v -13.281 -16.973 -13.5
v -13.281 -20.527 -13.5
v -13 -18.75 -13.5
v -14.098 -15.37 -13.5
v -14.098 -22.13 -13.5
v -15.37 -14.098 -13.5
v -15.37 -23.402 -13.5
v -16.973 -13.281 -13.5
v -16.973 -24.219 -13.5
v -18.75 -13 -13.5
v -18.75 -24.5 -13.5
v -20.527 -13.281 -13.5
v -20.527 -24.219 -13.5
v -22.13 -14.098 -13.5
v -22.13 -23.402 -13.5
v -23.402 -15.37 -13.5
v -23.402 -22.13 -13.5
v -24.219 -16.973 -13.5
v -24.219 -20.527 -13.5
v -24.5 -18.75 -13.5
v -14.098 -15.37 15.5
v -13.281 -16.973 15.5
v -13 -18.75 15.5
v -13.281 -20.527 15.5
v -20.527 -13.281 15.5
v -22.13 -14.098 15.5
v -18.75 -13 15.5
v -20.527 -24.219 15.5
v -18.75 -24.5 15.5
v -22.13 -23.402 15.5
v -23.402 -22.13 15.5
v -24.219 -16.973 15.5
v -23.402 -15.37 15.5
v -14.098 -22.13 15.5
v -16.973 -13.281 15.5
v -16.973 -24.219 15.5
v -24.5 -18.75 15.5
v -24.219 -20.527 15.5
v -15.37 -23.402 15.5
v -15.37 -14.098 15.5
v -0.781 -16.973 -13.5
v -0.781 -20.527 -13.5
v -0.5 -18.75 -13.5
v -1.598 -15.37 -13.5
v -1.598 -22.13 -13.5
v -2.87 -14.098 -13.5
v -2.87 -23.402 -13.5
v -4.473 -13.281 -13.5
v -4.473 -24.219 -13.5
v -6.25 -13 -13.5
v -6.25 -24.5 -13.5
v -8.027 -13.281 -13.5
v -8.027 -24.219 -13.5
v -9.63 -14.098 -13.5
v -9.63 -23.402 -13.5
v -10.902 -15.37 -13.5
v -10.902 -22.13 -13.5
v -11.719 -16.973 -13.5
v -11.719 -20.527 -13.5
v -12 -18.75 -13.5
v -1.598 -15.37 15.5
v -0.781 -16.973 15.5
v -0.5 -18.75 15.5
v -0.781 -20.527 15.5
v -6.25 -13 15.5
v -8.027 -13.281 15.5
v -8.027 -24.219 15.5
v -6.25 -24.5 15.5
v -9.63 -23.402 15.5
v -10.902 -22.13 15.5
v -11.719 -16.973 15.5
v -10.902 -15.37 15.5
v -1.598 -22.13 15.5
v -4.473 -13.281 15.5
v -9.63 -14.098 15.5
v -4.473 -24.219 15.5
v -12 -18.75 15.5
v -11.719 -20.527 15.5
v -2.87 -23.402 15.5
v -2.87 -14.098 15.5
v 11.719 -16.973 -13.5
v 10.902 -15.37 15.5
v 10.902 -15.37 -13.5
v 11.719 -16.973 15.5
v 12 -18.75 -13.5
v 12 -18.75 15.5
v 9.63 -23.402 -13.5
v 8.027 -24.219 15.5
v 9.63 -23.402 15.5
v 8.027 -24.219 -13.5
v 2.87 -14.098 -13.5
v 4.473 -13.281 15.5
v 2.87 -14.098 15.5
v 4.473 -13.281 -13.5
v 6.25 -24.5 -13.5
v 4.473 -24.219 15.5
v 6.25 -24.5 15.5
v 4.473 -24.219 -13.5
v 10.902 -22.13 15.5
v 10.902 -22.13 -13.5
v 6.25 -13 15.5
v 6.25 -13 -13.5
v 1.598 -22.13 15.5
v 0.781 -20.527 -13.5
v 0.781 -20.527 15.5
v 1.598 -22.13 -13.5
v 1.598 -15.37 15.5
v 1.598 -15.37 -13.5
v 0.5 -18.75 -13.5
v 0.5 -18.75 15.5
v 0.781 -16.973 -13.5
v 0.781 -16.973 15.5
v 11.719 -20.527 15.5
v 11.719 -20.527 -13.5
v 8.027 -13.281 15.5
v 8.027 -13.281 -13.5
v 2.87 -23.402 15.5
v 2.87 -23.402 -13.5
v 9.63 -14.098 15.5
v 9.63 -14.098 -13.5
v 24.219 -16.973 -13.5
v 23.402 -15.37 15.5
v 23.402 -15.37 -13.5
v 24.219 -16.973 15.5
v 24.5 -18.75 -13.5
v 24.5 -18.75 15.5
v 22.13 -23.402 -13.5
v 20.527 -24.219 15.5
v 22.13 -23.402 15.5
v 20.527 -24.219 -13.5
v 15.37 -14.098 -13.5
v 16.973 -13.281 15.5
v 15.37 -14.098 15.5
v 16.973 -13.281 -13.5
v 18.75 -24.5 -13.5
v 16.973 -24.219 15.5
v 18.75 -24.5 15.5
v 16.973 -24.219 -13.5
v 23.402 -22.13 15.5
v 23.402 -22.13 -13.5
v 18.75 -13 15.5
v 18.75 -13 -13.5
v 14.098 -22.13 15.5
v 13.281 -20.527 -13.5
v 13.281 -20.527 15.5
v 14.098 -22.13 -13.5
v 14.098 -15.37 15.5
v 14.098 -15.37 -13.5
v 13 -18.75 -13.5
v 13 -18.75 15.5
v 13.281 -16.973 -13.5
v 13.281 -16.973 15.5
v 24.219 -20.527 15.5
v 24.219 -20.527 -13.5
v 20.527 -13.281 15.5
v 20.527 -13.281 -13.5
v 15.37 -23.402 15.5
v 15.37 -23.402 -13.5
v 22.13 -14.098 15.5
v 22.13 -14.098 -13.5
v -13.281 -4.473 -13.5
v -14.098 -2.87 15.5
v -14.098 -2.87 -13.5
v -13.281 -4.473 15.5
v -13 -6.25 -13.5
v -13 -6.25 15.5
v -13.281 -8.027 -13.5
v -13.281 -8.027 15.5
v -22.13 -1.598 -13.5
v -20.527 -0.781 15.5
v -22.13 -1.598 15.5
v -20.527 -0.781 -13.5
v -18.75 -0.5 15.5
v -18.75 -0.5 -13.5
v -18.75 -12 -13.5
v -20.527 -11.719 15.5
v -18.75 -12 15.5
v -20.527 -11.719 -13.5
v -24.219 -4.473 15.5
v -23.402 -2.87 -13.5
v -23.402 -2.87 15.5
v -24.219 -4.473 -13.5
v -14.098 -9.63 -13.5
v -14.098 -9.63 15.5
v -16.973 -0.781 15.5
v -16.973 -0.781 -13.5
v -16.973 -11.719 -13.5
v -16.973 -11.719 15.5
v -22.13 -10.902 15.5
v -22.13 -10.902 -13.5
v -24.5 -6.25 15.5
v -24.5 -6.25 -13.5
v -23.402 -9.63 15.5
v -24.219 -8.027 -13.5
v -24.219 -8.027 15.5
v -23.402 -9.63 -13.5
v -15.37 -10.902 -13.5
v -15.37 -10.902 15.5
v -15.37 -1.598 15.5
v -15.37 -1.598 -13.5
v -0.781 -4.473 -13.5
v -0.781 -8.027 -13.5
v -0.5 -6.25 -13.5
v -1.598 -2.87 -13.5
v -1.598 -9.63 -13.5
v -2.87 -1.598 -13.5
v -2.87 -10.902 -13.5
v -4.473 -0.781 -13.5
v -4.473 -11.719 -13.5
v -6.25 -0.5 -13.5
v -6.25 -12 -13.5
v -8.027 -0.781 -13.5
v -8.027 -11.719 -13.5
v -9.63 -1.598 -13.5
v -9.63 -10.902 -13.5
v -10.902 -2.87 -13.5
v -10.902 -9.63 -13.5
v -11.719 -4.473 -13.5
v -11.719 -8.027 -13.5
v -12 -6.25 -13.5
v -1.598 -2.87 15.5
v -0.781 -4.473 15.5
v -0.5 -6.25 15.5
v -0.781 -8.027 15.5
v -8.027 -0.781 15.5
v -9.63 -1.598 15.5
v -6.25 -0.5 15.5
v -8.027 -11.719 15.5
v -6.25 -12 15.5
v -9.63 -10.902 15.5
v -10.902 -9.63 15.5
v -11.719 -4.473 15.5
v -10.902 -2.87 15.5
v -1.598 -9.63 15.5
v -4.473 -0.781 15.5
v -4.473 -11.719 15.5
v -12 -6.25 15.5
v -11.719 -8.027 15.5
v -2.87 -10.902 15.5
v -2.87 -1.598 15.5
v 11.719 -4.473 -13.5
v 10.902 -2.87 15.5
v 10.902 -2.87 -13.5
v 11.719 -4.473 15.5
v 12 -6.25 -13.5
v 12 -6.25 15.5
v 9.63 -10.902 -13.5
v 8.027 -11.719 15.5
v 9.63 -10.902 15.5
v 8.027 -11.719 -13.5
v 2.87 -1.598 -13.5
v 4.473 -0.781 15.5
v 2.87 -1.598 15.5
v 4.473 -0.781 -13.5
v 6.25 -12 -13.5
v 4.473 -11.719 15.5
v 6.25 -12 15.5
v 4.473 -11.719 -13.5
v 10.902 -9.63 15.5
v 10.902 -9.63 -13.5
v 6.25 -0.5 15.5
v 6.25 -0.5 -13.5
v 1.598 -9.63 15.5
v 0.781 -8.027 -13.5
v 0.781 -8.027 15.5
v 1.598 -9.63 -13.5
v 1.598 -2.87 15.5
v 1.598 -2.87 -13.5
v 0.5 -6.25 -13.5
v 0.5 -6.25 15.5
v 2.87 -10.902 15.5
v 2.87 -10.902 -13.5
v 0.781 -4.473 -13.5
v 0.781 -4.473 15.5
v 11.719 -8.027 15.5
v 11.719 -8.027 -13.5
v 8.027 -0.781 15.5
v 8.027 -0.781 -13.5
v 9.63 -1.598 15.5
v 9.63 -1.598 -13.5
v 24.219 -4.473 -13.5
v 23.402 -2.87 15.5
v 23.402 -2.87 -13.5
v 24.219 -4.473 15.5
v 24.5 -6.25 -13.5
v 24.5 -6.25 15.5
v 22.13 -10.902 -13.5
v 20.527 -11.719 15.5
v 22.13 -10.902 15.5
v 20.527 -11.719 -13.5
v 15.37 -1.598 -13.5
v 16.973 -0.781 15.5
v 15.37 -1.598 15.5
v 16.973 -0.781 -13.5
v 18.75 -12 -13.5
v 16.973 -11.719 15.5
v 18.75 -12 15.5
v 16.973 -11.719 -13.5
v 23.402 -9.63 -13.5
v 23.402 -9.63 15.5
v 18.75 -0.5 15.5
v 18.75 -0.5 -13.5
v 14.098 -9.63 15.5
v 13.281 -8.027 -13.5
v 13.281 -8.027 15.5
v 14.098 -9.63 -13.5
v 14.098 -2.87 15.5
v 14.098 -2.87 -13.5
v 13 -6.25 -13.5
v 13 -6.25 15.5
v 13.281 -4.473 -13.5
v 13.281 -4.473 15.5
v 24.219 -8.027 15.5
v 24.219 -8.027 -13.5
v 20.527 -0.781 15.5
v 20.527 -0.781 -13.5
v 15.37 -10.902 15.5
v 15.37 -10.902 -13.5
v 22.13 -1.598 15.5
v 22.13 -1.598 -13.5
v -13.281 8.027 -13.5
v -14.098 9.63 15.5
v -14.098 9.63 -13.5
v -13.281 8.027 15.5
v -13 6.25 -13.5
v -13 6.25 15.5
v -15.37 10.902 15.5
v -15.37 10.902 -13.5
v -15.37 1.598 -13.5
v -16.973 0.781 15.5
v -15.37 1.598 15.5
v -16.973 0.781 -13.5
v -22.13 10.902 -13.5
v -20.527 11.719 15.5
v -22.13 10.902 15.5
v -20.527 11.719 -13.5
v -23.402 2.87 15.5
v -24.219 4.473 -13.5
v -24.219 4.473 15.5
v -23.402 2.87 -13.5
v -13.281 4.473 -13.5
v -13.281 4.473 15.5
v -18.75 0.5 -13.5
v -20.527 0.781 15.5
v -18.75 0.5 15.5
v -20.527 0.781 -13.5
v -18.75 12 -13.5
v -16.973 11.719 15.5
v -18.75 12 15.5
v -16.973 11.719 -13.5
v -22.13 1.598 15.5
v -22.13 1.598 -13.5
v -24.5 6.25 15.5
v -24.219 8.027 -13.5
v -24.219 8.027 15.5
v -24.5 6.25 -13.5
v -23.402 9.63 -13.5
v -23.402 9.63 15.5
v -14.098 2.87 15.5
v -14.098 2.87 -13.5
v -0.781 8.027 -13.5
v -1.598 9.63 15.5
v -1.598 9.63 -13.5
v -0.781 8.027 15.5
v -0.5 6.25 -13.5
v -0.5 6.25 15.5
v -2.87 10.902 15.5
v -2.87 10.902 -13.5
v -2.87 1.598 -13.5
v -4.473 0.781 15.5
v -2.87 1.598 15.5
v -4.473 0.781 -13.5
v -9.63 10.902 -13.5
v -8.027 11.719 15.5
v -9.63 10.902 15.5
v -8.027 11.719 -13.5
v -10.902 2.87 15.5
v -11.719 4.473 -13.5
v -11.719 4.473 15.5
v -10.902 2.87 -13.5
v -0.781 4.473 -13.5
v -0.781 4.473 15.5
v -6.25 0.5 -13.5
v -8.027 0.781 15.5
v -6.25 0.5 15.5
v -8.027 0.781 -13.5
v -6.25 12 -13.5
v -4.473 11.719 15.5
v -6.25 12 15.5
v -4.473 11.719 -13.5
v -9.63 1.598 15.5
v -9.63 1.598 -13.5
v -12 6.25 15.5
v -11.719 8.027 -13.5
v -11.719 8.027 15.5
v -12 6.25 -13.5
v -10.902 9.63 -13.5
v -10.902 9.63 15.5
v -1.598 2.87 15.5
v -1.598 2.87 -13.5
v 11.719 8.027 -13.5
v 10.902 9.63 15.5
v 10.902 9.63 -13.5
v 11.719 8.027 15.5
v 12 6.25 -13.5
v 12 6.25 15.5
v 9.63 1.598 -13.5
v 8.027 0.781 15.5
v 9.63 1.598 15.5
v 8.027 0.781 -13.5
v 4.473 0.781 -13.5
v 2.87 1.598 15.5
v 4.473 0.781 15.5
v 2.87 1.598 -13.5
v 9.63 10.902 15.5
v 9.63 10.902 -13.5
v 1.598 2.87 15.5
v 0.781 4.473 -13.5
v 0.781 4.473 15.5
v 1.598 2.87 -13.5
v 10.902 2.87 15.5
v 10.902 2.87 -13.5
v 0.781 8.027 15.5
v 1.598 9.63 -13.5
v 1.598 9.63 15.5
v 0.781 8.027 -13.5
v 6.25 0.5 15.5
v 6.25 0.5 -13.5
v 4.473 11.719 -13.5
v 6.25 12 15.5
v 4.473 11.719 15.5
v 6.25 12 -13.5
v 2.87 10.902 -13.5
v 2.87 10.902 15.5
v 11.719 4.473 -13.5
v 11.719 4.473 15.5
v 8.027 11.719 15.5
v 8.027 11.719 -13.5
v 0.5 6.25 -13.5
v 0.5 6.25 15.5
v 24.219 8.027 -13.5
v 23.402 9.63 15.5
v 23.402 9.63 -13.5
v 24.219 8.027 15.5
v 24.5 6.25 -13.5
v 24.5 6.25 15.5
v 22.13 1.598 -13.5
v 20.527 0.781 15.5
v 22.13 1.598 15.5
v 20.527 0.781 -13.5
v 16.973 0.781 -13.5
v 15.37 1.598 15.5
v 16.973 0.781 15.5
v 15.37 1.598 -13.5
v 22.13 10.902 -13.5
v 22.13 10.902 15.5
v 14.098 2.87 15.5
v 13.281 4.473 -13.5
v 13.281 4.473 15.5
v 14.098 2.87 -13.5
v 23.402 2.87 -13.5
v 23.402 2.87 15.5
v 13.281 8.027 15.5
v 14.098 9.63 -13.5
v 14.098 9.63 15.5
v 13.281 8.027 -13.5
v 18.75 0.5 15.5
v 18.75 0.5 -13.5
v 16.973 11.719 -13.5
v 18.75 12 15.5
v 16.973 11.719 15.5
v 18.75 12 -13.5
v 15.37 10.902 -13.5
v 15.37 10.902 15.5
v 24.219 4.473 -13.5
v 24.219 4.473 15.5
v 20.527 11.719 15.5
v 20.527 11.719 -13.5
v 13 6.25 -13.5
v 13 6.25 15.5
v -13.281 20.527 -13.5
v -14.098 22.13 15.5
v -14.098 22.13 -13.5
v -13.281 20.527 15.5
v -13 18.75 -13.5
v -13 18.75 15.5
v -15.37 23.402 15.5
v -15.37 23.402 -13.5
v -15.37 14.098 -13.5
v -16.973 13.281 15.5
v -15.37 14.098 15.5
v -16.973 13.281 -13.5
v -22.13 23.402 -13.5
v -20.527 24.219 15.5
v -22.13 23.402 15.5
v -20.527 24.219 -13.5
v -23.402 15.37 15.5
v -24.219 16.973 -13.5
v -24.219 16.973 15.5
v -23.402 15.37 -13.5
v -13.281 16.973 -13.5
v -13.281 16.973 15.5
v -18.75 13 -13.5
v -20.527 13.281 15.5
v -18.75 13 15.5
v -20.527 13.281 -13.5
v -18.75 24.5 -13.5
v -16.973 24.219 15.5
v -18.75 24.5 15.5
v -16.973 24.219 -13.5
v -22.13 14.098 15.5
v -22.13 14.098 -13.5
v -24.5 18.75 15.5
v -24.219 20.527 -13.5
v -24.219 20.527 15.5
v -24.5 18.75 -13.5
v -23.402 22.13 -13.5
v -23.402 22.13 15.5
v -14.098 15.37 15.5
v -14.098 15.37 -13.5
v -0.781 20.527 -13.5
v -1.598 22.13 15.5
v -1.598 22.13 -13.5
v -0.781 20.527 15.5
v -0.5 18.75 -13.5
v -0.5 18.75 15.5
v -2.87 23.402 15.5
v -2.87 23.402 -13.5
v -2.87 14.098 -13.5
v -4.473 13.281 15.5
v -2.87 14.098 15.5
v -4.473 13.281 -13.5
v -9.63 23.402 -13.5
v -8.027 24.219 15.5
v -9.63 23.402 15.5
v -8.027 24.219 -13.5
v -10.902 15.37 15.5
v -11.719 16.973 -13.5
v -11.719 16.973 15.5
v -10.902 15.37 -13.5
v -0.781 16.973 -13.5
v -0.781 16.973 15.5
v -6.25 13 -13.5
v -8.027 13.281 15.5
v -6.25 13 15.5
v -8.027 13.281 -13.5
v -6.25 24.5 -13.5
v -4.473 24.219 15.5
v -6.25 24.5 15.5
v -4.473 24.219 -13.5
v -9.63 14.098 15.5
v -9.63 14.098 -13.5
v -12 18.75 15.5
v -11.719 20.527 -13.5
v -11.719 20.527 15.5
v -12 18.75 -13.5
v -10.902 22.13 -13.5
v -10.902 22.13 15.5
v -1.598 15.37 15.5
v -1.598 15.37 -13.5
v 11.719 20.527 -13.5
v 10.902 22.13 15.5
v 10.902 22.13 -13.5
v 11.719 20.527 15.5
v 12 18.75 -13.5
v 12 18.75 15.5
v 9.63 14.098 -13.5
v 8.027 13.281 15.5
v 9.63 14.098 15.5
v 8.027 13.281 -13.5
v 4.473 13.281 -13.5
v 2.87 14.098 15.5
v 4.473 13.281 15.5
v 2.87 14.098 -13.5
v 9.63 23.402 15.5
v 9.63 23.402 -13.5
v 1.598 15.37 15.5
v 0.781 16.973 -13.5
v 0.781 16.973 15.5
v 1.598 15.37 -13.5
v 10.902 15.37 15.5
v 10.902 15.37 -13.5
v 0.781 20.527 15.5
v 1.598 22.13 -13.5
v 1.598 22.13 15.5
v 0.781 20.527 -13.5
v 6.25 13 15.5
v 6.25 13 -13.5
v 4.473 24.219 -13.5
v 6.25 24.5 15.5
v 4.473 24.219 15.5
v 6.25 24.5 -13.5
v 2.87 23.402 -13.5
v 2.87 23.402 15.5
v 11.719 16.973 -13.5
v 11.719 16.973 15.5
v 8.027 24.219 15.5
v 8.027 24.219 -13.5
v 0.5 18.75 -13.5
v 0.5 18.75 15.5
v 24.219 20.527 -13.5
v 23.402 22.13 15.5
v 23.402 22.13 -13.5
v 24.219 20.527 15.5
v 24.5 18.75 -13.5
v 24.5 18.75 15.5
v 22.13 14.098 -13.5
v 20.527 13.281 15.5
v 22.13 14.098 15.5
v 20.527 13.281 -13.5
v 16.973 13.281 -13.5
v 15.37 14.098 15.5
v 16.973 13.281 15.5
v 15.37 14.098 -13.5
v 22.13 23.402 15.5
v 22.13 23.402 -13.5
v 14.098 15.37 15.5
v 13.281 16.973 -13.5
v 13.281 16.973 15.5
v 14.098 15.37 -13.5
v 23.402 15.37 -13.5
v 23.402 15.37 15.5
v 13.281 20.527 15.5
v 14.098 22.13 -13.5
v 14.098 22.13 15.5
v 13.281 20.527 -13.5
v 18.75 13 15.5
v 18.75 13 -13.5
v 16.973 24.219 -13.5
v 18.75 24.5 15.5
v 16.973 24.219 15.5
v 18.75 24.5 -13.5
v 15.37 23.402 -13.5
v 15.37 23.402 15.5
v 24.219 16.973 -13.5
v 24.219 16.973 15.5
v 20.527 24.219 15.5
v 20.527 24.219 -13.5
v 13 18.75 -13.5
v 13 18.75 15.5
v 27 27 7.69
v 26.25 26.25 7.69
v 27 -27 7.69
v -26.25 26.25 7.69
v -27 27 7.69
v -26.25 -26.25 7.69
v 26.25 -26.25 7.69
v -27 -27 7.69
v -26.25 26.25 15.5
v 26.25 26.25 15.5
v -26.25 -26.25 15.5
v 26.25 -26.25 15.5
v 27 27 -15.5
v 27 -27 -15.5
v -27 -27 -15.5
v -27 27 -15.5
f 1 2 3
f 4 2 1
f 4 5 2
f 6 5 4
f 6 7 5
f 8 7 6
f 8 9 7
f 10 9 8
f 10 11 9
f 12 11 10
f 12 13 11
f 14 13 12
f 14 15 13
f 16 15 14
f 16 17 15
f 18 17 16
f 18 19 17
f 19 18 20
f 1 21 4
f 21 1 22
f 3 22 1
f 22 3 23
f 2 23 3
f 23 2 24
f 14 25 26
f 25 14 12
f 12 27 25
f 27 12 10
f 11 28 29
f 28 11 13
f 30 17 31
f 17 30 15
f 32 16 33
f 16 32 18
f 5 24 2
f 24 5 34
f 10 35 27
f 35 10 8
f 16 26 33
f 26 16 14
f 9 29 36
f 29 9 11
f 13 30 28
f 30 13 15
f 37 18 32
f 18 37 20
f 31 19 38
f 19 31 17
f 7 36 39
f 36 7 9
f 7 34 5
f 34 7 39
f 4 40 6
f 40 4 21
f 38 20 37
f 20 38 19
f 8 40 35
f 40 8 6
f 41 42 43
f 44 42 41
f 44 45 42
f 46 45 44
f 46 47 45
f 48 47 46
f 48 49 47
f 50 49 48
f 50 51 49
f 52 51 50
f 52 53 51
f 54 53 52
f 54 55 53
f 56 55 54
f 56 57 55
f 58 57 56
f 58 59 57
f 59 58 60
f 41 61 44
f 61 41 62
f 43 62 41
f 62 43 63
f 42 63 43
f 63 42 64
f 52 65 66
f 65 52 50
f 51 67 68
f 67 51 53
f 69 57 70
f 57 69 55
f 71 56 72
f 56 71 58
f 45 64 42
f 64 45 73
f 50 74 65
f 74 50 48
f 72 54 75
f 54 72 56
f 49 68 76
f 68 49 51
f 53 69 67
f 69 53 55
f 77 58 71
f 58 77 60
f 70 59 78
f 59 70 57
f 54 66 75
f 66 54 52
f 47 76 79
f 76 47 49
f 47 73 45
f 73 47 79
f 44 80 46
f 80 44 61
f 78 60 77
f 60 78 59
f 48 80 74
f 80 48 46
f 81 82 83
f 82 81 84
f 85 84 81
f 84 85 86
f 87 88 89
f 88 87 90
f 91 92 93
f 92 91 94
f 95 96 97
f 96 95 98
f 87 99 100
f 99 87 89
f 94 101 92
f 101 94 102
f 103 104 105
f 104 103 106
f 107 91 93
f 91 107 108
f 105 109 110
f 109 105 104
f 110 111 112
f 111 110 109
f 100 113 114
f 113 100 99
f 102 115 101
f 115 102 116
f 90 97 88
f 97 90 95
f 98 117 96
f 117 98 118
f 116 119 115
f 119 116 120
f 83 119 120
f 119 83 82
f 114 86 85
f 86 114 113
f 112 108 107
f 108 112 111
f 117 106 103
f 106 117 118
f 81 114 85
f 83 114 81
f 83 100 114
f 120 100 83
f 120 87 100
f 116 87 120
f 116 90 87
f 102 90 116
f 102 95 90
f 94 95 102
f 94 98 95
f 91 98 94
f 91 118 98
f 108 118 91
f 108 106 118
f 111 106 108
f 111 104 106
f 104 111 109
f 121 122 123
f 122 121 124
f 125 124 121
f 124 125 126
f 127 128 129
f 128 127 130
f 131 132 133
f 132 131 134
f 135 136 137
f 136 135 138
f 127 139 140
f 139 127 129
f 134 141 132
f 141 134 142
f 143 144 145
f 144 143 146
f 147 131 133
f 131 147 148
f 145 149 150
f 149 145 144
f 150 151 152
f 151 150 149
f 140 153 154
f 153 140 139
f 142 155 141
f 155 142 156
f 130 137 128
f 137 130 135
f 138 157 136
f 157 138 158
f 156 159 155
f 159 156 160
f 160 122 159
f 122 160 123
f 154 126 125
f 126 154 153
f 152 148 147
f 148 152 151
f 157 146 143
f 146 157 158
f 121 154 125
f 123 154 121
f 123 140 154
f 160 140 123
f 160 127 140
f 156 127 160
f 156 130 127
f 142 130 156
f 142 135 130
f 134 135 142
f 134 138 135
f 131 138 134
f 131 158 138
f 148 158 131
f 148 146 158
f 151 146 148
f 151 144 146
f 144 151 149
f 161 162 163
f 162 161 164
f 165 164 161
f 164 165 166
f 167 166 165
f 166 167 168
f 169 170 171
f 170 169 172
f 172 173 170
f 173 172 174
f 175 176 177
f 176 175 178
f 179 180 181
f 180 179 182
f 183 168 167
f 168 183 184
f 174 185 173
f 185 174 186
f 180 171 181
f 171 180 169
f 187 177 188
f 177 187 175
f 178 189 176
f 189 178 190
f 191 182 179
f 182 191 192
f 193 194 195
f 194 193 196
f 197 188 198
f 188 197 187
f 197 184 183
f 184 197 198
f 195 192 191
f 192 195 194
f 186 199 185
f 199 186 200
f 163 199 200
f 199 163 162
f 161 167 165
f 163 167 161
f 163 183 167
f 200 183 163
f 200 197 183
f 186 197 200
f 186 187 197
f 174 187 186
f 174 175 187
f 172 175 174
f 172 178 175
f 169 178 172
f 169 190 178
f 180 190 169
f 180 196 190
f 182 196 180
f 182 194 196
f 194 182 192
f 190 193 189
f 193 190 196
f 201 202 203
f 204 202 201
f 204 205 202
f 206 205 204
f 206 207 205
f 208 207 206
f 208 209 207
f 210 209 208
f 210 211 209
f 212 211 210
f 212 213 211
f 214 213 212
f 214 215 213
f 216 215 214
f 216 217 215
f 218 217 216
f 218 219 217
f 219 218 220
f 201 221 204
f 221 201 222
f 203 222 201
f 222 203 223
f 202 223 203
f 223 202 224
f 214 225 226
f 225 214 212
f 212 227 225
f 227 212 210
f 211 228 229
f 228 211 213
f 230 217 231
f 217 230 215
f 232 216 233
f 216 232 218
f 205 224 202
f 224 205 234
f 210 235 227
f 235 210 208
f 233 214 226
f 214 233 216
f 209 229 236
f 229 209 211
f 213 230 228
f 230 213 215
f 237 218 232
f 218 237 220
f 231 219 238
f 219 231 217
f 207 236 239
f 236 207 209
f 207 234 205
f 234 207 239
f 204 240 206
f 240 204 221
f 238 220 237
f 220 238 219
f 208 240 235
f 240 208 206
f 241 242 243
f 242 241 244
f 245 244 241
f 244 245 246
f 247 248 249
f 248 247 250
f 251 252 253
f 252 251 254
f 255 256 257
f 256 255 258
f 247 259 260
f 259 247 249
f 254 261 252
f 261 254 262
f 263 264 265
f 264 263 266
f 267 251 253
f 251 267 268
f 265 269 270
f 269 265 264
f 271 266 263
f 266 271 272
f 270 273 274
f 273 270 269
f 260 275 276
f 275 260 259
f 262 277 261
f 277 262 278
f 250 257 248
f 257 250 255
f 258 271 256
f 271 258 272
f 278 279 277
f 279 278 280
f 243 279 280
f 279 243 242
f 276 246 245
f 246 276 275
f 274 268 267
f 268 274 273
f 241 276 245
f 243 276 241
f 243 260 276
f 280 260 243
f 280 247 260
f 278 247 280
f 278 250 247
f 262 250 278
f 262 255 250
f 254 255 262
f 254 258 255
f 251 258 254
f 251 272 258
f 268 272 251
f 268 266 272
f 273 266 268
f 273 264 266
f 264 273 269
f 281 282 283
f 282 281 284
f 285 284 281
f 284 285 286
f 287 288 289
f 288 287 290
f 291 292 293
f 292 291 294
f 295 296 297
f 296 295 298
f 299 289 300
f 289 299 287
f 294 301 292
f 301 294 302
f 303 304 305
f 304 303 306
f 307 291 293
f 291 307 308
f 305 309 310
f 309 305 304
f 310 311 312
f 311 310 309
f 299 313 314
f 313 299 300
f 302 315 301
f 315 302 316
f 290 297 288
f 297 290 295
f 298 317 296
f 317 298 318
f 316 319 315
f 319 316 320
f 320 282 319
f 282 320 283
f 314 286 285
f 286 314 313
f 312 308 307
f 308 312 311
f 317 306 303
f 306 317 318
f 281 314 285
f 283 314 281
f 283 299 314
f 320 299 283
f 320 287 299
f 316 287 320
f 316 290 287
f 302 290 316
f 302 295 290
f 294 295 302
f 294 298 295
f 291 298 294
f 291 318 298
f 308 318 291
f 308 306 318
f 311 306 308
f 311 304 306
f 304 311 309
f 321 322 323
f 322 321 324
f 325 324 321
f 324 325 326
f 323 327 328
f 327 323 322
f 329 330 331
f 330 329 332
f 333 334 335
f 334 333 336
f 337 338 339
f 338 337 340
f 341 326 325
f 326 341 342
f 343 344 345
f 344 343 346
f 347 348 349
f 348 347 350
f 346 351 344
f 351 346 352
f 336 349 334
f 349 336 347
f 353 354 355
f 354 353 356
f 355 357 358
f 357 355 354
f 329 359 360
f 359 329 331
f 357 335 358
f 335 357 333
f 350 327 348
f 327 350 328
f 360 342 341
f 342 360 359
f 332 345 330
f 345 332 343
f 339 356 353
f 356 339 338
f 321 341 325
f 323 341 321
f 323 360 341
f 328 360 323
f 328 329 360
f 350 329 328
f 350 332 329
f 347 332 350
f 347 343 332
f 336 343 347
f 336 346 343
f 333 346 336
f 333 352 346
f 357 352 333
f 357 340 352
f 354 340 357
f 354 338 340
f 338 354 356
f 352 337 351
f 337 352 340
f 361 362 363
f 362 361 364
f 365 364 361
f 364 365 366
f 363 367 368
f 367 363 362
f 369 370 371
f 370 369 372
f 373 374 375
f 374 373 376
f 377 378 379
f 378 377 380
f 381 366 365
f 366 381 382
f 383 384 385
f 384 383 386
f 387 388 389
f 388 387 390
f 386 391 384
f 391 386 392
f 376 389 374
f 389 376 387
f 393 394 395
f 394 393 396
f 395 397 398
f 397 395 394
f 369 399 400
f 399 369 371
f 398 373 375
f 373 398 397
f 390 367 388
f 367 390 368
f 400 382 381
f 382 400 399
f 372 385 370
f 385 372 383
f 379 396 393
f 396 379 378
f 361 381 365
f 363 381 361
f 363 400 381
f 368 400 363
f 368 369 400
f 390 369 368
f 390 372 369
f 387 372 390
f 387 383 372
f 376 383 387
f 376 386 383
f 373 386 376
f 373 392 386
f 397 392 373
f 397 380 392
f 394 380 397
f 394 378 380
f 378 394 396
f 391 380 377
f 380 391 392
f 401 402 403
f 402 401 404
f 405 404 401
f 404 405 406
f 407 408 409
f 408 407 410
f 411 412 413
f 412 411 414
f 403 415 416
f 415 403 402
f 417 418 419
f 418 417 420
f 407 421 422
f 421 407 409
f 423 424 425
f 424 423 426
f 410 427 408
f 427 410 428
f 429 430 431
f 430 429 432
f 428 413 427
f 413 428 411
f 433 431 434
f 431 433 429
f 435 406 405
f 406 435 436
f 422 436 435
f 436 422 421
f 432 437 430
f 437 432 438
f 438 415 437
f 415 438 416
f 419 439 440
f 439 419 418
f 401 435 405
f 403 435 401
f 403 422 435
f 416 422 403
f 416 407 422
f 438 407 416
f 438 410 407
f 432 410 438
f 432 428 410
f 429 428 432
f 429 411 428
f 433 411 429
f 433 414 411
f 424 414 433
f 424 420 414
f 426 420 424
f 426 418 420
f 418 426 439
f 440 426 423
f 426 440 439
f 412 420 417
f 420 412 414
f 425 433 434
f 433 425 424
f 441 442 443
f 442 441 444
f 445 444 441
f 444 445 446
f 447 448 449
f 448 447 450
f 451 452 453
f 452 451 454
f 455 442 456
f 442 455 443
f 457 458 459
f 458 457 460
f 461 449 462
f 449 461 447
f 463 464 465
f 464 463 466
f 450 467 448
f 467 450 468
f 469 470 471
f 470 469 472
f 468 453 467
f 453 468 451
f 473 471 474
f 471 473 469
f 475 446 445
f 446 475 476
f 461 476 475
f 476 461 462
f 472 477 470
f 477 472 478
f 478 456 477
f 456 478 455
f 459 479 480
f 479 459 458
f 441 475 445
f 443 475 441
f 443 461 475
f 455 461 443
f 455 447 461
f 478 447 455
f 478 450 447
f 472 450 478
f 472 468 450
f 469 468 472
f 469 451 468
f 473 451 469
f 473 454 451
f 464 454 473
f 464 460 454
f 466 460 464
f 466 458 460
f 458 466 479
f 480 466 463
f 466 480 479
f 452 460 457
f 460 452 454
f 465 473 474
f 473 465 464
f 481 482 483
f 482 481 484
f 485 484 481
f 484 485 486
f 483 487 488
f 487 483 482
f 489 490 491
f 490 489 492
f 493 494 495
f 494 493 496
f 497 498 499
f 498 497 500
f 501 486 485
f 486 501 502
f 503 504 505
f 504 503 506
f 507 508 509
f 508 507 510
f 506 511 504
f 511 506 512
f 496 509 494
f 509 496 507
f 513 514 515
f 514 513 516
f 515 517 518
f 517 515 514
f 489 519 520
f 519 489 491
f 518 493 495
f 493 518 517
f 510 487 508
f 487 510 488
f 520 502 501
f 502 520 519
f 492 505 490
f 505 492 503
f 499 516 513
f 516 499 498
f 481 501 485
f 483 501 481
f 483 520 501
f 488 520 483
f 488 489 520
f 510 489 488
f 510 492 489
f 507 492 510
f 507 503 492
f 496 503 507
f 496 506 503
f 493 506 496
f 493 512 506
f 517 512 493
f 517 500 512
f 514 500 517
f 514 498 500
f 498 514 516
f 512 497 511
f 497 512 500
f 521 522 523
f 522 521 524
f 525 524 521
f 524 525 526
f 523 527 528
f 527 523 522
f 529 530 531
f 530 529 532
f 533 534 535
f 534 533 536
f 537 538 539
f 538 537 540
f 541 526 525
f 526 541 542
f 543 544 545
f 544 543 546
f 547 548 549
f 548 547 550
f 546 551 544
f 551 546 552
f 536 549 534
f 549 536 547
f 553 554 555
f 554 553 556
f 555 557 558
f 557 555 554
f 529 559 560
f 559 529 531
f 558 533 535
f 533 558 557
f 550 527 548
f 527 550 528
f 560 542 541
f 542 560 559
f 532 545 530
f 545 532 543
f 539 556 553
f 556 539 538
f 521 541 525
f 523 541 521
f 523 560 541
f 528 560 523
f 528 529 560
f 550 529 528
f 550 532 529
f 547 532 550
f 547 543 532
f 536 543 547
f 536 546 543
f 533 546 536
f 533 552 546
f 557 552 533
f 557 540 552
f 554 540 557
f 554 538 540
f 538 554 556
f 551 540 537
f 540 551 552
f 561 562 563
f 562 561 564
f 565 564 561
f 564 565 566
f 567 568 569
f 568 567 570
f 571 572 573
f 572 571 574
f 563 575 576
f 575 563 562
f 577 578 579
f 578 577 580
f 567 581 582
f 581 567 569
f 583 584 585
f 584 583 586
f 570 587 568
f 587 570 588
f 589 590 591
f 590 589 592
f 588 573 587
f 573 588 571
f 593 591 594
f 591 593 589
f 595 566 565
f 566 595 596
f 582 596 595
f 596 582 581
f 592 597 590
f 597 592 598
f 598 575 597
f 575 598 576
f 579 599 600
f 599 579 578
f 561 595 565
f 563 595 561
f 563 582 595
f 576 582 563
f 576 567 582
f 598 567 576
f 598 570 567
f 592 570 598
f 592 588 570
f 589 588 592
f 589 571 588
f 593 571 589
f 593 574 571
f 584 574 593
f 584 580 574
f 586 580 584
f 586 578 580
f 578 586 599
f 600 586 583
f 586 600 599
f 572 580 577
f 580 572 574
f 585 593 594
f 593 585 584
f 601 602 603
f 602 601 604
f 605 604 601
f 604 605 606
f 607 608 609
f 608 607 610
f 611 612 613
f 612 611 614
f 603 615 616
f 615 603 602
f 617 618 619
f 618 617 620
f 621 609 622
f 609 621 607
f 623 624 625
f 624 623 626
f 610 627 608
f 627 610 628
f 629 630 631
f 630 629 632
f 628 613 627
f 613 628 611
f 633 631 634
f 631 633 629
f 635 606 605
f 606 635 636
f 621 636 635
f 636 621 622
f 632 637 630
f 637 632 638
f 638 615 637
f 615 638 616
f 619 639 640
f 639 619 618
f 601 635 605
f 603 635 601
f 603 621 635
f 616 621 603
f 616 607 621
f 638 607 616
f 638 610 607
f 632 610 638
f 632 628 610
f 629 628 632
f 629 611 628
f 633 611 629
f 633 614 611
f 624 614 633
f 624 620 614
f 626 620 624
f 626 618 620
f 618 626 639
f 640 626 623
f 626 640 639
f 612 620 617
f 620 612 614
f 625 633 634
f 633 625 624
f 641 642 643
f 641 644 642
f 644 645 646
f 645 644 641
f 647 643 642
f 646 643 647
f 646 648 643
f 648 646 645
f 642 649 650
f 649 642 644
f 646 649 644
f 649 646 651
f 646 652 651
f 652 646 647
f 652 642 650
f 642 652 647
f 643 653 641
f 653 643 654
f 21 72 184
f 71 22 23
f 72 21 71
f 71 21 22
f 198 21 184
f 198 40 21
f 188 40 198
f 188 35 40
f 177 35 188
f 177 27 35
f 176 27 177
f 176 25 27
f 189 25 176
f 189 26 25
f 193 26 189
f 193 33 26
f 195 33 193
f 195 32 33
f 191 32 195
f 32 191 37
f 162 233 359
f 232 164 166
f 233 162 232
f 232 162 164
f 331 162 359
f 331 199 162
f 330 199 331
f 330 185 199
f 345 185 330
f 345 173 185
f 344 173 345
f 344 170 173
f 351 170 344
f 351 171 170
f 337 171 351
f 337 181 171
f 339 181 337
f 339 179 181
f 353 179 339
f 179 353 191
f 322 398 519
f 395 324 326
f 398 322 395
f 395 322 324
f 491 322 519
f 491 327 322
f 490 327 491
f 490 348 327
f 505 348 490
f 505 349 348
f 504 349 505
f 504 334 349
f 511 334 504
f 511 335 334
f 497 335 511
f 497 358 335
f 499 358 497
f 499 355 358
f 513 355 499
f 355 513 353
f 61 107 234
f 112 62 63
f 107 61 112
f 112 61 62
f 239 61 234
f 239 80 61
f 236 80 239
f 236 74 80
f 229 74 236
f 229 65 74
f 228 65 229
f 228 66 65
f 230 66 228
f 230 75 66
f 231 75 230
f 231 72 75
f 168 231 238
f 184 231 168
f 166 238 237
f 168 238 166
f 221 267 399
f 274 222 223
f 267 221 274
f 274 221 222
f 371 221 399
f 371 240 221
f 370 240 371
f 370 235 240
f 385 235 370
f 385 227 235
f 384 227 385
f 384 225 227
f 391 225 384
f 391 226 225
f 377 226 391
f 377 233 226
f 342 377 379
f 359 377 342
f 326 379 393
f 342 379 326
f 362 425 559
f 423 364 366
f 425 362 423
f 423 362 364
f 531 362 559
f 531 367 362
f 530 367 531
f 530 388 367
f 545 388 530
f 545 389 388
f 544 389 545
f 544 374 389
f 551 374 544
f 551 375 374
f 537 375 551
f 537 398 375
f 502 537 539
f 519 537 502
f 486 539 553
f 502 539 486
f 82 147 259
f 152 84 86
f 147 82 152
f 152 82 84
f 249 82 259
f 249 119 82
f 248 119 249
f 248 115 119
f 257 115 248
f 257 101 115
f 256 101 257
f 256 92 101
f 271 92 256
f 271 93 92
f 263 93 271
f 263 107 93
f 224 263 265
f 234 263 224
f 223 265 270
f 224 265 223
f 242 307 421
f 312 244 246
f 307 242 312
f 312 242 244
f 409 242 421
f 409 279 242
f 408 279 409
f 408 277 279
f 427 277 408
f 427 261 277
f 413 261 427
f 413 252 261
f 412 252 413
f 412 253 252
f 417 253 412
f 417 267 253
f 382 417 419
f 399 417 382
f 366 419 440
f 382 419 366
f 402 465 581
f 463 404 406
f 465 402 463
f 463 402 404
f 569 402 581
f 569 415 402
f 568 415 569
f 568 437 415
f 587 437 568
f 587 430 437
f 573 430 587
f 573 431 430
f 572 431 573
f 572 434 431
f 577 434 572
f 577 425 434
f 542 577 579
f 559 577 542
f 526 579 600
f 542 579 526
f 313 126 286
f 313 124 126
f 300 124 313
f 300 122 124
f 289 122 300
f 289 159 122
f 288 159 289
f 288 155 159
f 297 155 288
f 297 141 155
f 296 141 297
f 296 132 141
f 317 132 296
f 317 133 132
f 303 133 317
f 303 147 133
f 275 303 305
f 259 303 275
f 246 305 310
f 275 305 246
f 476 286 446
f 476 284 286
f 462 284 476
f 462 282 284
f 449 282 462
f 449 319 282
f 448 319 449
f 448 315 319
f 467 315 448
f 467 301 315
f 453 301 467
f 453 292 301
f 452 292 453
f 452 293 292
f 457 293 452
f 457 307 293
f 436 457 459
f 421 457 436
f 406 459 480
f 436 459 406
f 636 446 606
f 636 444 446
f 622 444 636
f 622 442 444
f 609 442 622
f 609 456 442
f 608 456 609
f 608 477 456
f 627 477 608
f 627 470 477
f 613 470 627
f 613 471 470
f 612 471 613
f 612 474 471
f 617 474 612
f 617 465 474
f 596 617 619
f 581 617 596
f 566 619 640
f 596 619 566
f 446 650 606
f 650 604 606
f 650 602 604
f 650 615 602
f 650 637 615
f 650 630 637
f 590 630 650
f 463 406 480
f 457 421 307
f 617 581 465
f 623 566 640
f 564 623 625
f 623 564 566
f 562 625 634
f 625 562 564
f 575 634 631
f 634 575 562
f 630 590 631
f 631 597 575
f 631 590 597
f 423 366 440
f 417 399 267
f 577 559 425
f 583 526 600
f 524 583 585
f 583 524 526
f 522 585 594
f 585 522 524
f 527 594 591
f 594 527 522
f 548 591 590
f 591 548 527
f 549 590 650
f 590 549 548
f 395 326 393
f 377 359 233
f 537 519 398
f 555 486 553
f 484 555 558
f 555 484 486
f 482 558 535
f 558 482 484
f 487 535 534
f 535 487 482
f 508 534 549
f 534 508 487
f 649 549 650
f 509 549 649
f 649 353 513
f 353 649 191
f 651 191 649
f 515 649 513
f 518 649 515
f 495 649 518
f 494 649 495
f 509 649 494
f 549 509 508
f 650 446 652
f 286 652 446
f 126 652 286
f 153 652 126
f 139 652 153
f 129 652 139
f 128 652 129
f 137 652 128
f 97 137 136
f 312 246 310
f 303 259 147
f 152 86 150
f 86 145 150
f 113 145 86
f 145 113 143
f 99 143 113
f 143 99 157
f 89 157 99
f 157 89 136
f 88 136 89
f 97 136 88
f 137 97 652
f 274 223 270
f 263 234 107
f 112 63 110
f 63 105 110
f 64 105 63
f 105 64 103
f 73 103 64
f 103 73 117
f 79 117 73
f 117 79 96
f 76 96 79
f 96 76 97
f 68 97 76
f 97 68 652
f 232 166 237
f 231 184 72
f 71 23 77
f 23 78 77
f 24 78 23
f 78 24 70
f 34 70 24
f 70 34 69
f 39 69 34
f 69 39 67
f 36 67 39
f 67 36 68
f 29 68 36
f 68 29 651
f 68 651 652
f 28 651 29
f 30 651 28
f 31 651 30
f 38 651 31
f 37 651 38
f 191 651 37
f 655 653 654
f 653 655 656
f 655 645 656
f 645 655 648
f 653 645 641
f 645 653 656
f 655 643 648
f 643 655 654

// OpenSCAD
// [FL_INDEX: keywords="openscad, 3d_parametric, Battery_Box, csg_solid" | COT="Parametric OpenSCAD design from 3DCodeverse"]
// Title: Battery Box


height=31;		//box height
diam=11.5;		//battery diameter 
rows=4;
spacing=1;
width=(diam+spacing)*rows+4;


   difference()
  {
			 intersection()
      {
			cube([width,width,height], center = true);
		}

for ( j = [(-width/2)+(width-rows*(diam+spacing))/2+(diam+spacing)/2: diam+spacing : ((width/2))] )
	{
		for ( i = [(-width/2)+(width-rows*(diam+spacing))/2+(diam+spacing)/2 : diam+spacing : ((width/2))] )
		{
			translate([i , j, 2]) cylinder(h = height, r = diam/2, center = true, $fn=20 );
		}
	}
		for ( k = [0 : 3] )
		{
			 rotate([0, 0, k * 90])
				translate([width/2 , width/2, height/2-8/2.1])cube([width*2,1.5,8], center = true);
		}
}
